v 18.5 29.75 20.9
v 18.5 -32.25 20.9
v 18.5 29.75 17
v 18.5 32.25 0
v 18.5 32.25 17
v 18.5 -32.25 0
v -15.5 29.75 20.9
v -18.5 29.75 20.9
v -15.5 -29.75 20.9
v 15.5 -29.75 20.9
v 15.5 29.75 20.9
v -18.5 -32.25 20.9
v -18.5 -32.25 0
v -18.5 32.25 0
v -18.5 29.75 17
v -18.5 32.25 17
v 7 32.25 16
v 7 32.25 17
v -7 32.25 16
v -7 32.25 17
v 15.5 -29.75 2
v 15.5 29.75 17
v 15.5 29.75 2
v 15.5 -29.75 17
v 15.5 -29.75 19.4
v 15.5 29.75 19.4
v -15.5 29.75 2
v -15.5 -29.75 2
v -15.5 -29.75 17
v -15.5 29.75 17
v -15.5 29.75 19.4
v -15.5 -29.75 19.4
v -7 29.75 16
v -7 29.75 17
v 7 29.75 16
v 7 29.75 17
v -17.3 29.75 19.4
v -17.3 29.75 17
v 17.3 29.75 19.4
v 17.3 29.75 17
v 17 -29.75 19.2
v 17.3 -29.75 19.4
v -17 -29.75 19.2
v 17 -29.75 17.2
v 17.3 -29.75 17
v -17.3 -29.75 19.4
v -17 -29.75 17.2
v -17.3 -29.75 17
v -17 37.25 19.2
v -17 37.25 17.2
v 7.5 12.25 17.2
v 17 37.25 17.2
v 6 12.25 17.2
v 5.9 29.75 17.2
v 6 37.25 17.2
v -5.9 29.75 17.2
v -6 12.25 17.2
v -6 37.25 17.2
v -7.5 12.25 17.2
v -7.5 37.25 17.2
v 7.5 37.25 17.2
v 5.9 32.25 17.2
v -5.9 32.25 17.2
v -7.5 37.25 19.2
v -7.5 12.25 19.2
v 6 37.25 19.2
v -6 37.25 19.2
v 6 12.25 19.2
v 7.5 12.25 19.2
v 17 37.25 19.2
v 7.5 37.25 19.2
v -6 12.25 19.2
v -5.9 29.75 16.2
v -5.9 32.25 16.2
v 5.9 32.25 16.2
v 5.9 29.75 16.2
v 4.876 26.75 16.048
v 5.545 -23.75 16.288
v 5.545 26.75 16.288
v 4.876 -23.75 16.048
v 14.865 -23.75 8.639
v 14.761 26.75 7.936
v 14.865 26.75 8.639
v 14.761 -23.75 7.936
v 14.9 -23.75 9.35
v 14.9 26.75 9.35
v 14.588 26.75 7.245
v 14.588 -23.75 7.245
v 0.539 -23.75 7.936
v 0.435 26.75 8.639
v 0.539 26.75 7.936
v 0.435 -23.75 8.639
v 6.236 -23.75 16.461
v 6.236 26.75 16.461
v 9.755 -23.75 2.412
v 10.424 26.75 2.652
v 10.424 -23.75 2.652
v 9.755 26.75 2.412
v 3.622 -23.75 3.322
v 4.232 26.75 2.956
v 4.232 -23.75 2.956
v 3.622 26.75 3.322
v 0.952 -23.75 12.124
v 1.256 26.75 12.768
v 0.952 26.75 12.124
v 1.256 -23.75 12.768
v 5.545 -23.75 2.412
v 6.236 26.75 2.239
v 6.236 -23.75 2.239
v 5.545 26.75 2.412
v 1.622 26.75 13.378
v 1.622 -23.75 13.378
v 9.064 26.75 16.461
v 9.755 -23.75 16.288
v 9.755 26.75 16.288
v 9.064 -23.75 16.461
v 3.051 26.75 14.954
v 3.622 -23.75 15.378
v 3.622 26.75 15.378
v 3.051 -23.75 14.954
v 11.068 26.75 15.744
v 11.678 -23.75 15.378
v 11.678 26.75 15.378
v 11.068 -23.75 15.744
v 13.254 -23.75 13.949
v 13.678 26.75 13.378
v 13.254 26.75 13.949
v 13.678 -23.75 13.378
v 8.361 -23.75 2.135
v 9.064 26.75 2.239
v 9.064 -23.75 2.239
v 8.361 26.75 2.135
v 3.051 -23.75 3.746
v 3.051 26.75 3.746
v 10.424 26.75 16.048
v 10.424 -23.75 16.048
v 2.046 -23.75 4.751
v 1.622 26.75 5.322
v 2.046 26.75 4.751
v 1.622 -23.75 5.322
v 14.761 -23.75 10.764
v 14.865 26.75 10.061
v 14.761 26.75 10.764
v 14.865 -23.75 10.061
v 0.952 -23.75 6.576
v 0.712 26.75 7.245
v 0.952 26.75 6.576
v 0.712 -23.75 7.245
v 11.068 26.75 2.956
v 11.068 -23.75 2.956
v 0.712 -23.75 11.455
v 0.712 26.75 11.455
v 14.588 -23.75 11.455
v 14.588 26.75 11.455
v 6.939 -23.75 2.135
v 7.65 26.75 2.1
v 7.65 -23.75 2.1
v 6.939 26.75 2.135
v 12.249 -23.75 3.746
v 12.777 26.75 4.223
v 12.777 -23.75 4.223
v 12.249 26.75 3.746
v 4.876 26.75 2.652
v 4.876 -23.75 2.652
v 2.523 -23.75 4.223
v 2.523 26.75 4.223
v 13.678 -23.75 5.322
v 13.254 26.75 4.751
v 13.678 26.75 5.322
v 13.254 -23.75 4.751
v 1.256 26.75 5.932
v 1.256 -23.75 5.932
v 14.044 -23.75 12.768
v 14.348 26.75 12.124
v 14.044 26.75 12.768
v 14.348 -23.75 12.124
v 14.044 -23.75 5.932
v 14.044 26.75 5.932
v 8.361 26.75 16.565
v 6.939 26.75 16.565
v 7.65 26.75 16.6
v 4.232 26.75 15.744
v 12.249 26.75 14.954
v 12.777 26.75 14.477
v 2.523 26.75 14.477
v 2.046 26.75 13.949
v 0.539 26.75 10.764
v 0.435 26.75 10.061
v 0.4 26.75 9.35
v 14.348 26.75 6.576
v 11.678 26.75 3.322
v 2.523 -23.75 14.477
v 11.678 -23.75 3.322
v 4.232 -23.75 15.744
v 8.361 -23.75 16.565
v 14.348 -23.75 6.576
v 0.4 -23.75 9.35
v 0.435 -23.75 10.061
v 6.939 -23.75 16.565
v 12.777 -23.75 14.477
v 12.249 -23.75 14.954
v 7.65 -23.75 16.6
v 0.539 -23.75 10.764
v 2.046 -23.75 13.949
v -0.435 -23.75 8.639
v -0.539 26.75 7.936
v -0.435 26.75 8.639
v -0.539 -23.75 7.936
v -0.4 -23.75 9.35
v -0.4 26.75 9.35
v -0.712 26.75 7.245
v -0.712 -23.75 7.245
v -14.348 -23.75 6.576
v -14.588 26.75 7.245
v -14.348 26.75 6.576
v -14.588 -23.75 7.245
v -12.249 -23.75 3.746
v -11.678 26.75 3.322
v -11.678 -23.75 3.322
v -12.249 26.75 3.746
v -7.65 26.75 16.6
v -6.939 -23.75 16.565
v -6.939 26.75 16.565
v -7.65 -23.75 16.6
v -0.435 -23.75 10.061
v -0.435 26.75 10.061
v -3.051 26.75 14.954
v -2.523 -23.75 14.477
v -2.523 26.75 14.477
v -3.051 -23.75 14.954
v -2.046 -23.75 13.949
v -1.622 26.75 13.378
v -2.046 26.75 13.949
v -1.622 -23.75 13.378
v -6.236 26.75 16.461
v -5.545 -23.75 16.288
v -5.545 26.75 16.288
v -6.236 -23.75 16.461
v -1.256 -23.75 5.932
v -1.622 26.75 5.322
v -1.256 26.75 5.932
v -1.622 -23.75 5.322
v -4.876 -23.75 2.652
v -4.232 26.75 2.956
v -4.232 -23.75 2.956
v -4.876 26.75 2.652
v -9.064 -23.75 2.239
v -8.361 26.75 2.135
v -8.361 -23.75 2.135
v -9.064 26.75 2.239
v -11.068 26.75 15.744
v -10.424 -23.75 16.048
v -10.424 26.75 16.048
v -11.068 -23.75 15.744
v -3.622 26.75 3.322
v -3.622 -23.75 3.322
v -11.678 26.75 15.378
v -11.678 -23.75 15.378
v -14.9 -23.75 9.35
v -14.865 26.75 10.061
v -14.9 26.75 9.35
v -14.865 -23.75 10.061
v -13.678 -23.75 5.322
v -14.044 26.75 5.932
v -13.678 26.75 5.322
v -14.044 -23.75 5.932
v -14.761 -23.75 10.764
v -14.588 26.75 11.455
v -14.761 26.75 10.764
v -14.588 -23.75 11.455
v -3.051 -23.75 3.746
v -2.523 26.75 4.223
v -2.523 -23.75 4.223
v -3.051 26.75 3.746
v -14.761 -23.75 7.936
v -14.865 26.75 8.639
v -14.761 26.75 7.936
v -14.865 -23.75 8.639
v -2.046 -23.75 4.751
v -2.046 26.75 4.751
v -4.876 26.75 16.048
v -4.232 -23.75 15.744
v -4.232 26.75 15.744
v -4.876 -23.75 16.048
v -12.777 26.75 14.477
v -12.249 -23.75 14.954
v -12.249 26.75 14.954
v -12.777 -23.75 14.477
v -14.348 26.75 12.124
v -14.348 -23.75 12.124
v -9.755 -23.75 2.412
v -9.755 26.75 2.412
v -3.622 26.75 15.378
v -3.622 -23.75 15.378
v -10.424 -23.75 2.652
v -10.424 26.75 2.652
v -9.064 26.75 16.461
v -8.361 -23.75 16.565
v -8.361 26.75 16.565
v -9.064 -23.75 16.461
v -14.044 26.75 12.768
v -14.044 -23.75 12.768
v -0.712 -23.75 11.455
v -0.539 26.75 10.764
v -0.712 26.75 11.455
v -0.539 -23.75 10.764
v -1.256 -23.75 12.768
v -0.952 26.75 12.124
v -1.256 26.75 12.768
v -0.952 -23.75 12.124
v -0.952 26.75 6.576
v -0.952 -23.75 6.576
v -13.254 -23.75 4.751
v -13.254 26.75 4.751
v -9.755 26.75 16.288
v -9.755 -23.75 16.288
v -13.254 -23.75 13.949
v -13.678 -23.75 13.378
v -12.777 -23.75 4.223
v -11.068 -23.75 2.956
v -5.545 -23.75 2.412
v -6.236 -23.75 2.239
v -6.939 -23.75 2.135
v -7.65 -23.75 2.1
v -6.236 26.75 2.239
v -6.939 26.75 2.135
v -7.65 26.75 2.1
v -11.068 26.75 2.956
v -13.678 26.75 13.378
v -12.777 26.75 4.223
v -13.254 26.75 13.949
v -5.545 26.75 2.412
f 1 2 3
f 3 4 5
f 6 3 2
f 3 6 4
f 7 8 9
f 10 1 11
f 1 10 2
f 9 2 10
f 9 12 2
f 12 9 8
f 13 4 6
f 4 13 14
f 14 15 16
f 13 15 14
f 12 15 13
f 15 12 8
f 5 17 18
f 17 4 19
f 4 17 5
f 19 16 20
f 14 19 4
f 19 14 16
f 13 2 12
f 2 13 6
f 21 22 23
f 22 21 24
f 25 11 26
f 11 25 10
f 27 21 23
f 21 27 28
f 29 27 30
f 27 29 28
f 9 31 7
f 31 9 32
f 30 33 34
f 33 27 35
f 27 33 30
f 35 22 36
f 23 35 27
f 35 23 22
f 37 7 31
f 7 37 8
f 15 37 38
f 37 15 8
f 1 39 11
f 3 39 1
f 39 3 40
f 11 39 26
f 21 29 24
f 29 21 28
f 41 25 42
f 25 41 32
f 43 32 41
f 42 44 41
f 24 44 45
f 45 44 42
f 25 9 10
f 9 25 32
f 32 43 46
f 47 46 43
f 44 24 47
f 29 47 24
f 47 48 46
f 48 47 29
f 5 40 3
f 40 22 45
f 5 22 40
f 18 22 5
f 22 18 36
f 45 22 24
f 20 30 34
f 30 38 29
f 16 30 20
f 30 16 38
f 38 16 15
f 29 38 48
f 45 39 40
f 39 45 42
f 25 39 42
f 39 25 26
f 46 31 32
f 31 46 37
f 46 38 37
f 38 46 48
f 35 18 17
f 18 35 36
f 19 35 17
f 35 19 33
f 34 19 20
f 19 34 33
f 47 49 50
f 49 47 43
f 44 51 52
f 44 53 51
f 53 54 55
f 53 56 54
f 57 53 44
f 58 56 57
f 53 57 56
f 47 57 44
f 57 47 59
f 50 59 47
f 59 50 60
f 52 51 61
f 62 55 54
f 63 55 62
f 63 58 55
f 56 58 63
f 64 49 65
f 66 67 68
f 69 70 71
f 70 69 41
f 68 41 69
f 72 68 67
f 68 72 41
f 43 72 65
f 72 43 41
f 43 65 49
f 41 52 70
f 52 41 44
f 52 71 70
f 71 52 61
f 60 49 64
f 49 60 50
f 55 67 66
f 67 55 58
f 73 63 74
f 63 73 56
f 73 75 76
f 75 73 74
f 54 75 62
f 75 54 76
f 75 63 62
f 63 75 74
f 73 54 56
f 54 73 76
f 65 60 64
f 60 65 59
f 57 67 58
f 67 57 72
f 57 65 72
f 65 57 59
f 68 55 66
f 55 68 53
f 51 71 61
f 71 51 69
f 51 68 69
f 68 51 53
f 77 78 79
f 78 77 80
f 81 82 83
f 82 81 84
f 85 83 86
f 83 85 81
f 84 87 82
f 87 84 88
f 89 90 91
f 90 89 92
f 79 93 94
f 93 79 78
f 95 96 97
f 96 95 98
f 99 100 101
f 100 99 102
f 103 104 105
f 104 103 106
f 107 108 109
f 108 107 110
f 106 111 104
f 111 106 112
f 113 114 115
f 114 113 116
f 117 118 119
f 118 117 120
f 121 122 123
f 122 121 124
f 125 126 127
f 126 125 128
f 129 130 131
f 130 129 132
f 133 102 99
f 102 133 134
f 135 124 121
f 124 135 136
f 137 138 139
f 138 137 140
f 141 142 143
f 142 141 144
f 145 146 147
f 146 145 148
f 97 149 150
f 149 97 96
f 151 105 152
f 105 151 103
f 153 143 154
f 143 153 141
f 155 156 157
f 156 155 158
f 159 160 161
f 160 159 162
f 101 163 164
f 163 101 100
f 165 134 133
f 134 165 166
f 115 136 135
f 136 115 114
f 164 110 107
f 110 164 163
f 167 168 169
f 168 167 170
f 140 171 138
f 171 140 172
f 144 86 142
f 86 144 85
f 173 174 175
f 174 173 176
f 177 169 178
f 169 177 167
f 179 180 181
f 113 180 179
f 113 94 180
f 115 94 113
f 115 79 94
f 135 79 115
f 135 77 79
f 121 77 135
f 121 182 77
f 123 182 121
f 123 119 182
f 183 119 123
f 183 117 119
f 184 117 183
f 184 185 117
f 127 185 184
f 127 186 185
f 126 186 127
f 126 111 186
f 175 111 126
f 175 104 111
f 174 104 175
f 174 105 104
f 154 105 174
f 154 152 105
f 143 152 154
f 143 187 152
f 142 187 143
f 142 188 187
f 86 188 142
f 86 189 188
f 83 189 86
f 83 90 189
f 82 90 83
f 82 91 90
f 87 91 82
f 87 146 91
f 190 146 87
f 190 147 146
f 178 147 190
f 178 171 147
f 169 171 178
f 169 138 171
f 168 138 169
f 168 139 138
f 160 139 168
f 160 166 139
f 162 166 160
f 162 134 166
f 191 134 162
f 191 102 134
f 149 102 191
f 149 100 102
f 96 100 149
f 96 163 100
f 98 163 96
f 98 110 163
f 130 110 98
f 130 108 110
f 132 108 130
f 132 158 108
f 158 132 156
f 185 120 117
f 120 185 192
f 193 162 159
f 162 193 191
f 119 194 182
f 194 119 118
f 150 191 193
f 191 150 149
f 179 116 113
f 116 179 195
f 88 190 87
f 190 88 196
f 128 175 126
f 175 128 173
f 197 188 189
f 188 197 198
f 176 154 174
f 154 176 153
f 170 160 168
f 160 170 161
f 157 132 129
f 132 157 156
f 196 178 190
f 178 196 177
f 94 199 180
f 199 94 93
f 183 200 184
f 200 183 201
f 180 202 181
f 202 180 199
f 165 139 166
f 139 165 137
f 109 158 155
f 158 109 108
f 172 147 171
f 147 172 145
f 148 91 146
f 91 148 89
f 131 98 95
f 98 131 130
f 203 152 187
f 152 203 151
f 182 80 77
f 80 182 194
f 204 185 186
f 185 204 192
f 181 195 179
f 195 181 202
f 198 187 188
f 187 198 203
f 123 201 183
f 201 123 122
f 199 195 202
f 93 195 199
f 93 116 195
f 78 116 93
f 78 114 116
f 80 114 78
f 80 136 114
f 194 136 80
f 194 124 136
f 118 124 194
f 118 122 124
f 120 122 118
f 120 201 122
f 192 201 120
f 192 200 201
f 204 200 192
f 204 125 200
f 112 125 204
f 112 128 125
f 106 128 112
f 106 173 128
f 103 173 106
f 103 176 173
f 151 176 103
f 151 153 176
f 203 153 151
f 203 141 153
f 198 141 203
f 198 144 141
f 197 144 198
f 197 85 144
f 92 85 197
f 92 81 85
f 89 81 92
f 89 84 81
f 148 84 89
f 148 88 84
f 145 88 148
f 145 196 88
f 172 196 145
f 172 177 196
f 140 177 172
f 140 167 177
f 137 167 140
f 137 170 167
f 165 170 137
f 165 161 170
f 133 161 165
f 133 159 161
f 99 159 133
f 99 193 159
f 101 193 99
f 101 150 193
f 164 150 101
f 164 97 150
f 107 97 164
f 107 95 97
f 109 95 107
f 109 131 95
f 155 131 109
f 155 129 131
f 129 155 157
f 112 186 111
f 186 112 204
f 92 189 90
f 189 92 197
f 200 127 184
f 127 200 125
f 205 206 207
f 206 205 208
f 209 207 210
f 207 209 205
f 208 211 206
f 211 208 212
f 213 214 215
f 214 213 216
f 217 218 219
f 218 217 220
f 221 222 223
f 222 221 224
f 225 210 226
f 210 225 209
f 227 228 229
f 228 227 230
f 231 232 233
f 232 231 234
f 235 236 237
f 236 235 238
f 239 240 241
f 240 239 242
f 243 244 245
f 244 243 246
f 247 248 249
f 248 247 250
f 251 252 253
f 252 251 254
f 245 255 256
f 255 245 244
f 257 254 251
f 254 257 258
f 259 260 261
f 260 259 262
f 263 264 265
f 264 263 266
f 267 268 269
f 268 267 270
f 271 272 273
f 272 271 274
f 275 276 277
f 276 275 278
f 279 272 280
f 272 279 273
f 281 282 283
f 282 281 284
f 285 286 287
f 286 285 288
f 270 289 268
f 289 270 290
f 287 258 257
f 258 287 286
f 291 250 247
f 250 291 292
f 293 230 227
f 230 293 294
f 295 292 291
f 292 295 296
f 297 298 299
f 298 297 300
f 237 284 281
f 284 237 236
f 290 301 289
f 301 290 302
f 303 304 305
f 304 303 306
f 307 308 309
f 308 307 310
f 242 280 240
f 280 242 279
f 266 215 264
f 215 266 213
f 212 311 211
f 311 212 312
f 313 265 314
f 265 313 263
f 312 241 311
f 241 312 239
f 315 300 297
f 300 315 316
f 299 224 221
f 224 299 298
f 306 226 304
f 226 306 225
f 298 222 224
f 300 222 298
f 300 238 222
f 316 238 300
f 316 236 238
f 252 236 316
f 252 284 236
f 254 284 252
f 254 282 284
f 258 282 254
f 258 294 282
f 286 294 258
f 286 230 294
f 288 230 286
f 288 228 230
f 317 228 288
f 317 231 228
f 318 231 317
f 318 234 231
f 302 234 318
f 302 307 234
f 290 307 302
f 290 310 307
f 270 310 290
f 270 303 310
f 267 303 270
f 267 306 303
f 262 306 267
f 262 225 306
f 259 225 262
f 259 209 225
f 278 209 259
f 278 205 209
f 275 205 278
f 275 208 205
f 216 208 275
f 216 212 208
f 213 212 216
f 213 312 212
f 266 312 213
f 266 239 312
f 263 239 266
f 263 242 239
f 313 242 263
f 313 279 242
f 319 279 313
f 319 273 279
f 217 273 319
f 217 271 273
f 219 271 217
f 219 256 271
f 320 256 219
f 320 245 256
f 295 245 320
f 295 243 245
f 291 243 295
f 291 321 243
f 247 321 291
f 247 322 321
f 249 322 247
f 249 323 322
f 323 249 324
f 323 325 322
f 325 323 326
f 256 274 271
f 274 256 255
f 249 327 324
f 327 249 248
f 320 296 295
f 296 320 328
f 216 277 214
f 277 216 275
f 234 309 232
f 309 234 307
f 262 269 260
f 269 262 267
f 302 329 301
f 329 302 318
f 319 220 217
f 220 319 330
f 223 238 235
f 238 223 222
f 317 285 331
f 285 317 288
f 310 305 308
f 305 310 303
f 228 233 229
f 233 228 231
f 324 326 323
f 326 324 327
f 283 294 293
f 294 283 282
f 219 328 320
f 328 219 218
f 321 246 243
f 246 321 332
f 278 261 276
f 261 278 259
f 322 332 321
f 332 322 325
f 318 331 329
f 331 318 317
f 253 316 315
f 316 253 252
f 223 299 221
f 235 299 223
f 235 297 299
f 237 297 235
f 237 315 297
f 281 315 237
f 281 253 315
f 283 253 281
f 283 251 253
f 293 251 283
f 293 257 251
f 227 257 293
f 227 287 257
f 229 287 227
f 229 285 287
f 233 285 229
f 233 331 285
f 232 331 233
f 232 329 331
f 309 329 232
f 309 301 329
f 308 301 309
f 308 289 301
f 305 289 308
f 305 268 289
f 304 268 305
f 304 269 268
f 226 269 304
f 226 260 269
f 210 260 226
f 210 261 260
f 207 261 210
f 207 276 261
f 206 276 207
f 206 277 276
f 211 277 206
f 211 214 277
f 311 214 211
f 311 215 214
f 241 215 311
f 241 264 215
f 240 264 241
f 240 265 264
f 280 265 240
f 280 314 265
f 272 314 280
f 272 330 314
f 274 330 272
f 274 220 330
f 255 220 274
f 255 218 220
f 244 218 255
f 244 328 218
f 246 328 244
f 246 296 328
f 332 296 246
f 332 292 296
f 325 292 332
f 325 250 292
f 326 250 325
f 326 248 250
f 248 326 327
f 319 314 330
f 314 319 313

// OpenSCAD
/* Holder for two AA batteries with sliding cover.
   PLA, 0.4mm nozzle, no supports. Units mm.
   Print orientation: +Z up, parts rest on min z.
*/

// ---------- parameters ----------
battery_d = 14.5;
battery_l = 50.5;
side_gap = 0.6;      // battery side to wall
mid_gap = 0.8;       // between batteries
Wi = 2*battery_d + mid_gap + 2*side_gap; // 31.0 interior width
Li = battery_l + 3 + 6;                  // 59.5 interior length
floor_t = 2.0;
side_t = 3.0;
end_t = 2.5;
Wext = Wi + 2*side_t;   // 37
Lext = Li + 2*end_t;    // 64.5
wall_top = 20.9;
low_top = 17.0;
groove_bottom = 17.0;
groove_h = 2.4;
groove_top = groove_bottom + groove_h; // 19.4
groove_depth = 1.8;
engage = 1.5;
Wc = Wi + 2*engage;     // 34 cover width
Lc0 = Lext;             // 64.5 main length
lip_len = 5.0;
Lc = Lc0 + lip_len;     // 69.5 total cover length
y0b = -Lext/2;          // -32.25 base min y
y1b = Lext/2;           // 32.25 base max y
y0c = -Lext/2;          // -32.25 cover min y
y1c = Lext/2 + lip_len; // 37.25 cover max y
tc = 2.0;
finger_w = 12;
slot_w = 1.5;
finger_y0 = 12.25;
tooth_w = 11.8;
tooth_yl = 2.5;
tooth_y0 = 29.75;
tooth_y1 = tooth_y0 + tooth_yl; // 32.25
tooth_h = 1.0;
notch_hw = 7;
notch_y0 = 29.65;
notch_y1 = 32.35;
notch_bot = 16.0;
bx = battery_d/2 + mid_gap/2; // 7.65 battery center x
battery_y0 = -Li/2 + 6;       // -23.75 spring side
battery_y1 = battery_y0 + battery_l; // 26.75
battery_yc = (battery_y0 + battery_y1)/2; // 1.5
battery_zc = floor_t + battery_d/2 + 0.1; // 9.35 slight lift
wire_z = 5;
wire_r = 1.0;

part = "assembly"; // [base, cover, assembly]
cadverify_only = "";
module instance(name, part, unit = 1) {
    echo(cadverify_instance = [name, part, unit]);
    if (cadverify_only == "" || cadverify_only == name) children();
}

module battery() {
    rotate([-90,0,0])
        cylinder(d=battery_d, h=battery_l, center=true, $fn=64);
}

module base() {
    difference() {
        // outer solid
        translate([-Wext/2, y0b, 0])
            cube([Wext, Lext, wall_top]);
        // interior cavity open at top
        translate([-Wi/2, -Li/2, floor_t])
            cube([Wi, Li, wall_top - floor_t + 1]);
        // low end wall cut (+Y end)
        translate([-Wext/2, Li/2, low_top])
            cube([Wext, Lext/2 - Li/2 + 0.5, wall_top - low_top + 1]);
        // left groove
        translate([Wi/2, -Li/2, groove_bottom])
            cube([groove_depth, Li/2 + Lext/2 + 0.5, groove_h]);
        // right groove
        translate([-Wi/2 - groove_depth, -Li/2, groove_bottom])
            cube([groove_depth, Li/2 + Lext/2 + 0.5, groove_h]);
        // wire holes through spring (-Y) wall
        translate([bx, y0b - 1, wire_z])
            rotate([90,0,0])
                cylinder(r=wire_r, h=end_t + 2, $fn=24);
        translate([-bx, y0b - 1, wire_z])
            rotate([90,0,0])
                cylinder(r=wire_r, h=end_t + 2, $fn=24);
        // latch notch in low wall top
        translate([-notch_hw, notch_y0, notch_bot])
            cube([2*notch_hw, notch_y1 - notch_y0, low_top - notch_bot + 0.02]);
    }
}

module cover() {
    // print orientation: plate 0..tc, tooth on top tc..tc+tooth_h
    difference() {
        union() {
            translate([-Wc/2, y0c, 0])
                cube([Wc, Lc, tc]);
            // latch tooth on top (becomes bottom after flip)
            translate([-tooth_w/2, tooth_y0, tc])
                cube([tooth_w, tooth_yl, tooth_h]);
        }
        // finger slots, open at +Y lip end
        translate([finger_w/2, finger_y0, -0.5])
            cube([slot_w, y1c - finger_y0 + 0.5, tc + 1.5]);
        translate([-finger_w/2 - slot_w, finger_y0, -0.5])
            cube([slot_w, y1c - finger_y0 + 0.5, tc + 1.5]);
    }
}

module assembly() {
    instance("base", "base", 1) base();
    instance("battery_left", "external", 1)
        translate([bx, battery_yc, battery_zc]) battery();
    instance("battery_right", "external", 1)
        translate([-bx, battery_yc, battery_zc]) battery();
    // cover printed upside-down: rotate 180 about Y then lift
    instance("cover", "cover", 1)
        translate([0, 0, 19.2]) rotate([0,180,0]) cover();
}

// ---------- specs ----------
if (part == "base") {
    echo(cadverify_spec = [
        ["bounds", [[-Wext/2, y0b, 0], [Wext/2, y1b, wall_top]]],
        ["bodies", 1],
        ["through_holes", 2],
        ["support_faces", [["bottom", "-z", 2000]]],
        ["overhangs_allowed", [
            ["groove ceilings bridge 3.6mm", [[Wi/2 - 0.6, -Li/2 - 0.5, groove_bottom - 0.5], [Wi/2 + groove_depth + 0.5, y1b + 0.2, groove_top + 0.6]]],
            ["groove ceilings bridge 3.6mm", [[-Wi/2 - groove_depth - 0.5, -Li/2 - 0.5, groove_bottom - 0.5], [-Wi/2 + 0.6, y1b + 0.2, groove_top + 0.6]]],
            ["wire holes 2mm dia bridges", [[-10, y0b - 0.5, wire_z - 1.5], [10, -Li/2 + 0.5, wire_z + 1.5]]]
        ]],
        ["copies", 1],
        ["details", [
            ["cavity", "void", [[-Wi/2, -Li/2, floor_t], [Wi/2, Li/2, 17]], 0.9],
            ["spring_room", "void", [[-Wi/2, -Li/2, floor_t], [Wi/2, -Li/2 + 6, 16.6]], 0.9],
            ["pos_room", "void", [[-Wi/2, Li/2 - 3, floor_t], [Wi/2, Li/2, 16.6]], 0.9],
            ["groove_left", "void", [[Wi/2, -Li/2, groove_bottom], [Wi/2 + groove_depth, y1b, groove_top]], 0.85],
            ["groove_right", "void", [[-Wi/2 - groove_depth, -Li/2, groove_bottom], [-Wi/2, y1b, groove_top]], 0.85],
            ["notch", "void", [[-notch_hw, notch_y0, notch_bot], [notch_hw, notch_y1, low_top + 0.02]], 0.85],
            ["wire1", "hole", [bx, y0b - 1, wire_z], [0, 1, 0], [[0, 2], [2.5, 2]]],
            ["wire2", "hole", [-bx, y0b - 1, wire_z], [0, 1, 0], [[0, 2], [2.5, 2]]],
            ["floor", "thickness", [0, 0, -1], [0, 0, 1], 2.0],
            ["side_wall", "thickness", [Wext/2 + 1, 0, 18.2], [-1, 0, 0], 1.2],
            ["end_wall", "thickness", [0, y1b + 1, 10], [0, -1, 0], 2.5]
        ]]
    ]);
    base();
} else if (part == "cover") {
    echo(cadverify_spec = [
        ["bounds", [[-Wc/2, y0c, 0], [Wc/2, y1c, tc + tooth_h]]],
        ["bodies", 1],
        ["through_holes", 0],
        ["support_faces", [["bottom", "-z", 1500]]],
        ["overhangs_allowed", []],
        ["copies", 1],
        ["details", [
            ["plate", "thickness", [0, -10, -1], [0, 0, 1], 2.0],
            ["finger", "material", [[-finger_w/2, finger_y0, 0], [finger_w/2, y1c, tc]], 0.85],
            ["slot_left", "void", [[finger_w/2, finger_y0, -0.5], [finger_w/2 + slot_w, y1c + 0.01, tc + 0.5]], 0.85],
            ["slot_right", "void", [[-finger_w/2 - slot_w, finger_y0, -0.5], [-finger_w/2, y1c + 0.01, tc + 0.5]], 0.85],
            ["tooth", "material", [[-tooth_w/2, tooth_y0, tc], [tooth_w/2, tooth_y1, tc + tooth_h]], 0.85],
            ["lip", "material", [[-Wc/2, y1b, 0], [Wc/2, y1c, tc]], 0.9]
        ]]
    ]);
    cover();
} else if (part == "assembly") {
    echo(cadverify_spec = [
        ["bounds", [[-Wext/2, y0b, 0], [Wext/2, y1c, wall_top]]],
        ["support_faces", [["bottom", "-z", 2000]]],
        ["allowed_interferences", []],
        ["motions", [
            ["slide_cover", ["cover"], "slide", [0, 1, 0], [0, 50], ["flex", [["cover", "base", 1.0, "latch tooth rides over end wall"]]]]
        ]],
        ["assembly_order", [
            [["base"], [0, 0, 0]],
            [["battery_left"], [0, 0, -1]],
            [["battery_right"], [0, 0, -1]],
            [["cover"], [0, -1, 0]]
        ]]
    ]);
    assembly();
}
